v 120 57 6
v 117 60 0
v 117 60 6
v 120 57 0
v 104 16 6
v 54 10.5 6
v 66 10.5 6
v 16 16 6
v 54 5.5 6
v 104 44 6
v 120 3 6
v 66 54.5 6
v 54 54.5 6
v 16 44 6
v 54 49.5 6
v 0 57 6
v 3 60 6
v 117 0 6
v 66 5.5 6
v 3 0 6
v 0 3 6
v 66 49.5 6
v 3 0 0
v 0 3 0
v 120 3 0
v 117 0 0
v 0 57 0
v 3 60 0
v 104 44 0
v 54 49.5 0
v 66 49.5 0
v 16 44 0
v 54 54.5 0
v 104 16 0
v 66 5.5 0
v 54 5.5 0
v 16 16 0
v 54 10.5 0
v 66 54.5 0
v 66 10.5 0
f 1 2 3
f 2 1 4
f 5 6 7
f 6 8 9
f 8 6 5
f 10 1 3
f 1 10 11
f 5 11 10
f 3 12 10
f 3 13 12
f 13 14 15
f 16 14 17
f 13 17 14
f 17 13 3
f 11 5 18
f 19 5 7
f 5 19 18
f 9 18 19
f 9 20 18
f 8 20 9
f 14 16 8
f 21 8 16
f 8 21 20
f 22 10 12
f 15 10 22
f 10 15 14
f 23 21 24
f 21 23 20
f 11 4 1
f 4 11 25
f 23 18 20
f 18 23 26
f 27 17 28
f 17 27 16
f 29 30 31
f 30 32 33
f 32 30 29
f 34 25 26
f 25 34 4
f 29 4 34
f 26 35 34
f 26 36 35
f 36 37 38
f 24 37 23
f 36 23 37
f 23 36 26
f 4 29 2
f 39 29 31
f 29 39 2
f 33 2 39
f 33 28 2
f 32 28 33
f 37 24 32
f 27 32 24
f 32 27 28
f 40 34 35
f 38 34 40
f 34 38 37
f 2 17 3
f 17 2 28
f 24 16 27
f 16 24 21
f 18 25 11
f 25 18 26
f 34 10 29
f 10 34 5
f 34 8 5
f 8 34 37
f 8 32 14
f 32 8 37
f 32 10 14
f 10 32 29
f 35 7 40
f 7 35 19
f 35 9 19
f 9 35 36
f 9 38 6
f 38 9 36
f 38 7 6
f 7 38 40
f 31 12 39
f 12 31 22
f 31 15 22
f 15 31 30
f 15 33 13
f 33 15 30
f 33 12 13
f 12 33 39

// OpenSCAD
$fn = 32;

// ----------------------------------------------------------------------
// Frame plate: 120 x 60 frame, 16 mm rails
// ----------------------------------------------------------------------

// --- parameters (mm) ---
plate_l = 120;            // plate length, X
plate_w = 60;             // plate width, Y
plate_t = 6;              // plate thickness, Z (extrusion height)
corner_c = 3;             // corner chamfer
frame_bar = 16;           // frame rail width
slot_l = 12;              // adjustment slot length
slot_w = 5;               // adjustment slot width

win_l = plate_l - 2 * frame_bar;  // window length
win_w = plate_w - 2 * frame_bar;  // window width

profile = [[3, 0], [117, 0], [120, 3], [120, 57], [117, 60], [3, 60], [0, 57], [0, 3]];  // primary outline, 8 points, counter clockwise
void_1 = [[16, 16], [104, 16], [104, 44], [16, 44]];  // the window, 4 points
void_2 = [[54, 5.5], [66, 5.5], [66, 10.5], [54, 10.5]];  // adjustment slot, 4 points
void_3 = [[54, 49.5], [66, 49.5], [66, 54.5], [54, 54.5]];  // adjustment slot, 4 points

// --- the one profile operation ---
difference() {
  linear_extrude(height = plate_t) polygon(points = profile);
  translate([0, 0, -1])
    linear_extrude(height = plate_t + 2) polygon(points = void_1);
  translate([0, 0, -1])
    linear_extrude(height = plate_t + 2) polygon(points = void_2);
  translate([0, 0, -1])
    linear_extrude(height = plate_t + 2) polygon(points = void_3);
}
